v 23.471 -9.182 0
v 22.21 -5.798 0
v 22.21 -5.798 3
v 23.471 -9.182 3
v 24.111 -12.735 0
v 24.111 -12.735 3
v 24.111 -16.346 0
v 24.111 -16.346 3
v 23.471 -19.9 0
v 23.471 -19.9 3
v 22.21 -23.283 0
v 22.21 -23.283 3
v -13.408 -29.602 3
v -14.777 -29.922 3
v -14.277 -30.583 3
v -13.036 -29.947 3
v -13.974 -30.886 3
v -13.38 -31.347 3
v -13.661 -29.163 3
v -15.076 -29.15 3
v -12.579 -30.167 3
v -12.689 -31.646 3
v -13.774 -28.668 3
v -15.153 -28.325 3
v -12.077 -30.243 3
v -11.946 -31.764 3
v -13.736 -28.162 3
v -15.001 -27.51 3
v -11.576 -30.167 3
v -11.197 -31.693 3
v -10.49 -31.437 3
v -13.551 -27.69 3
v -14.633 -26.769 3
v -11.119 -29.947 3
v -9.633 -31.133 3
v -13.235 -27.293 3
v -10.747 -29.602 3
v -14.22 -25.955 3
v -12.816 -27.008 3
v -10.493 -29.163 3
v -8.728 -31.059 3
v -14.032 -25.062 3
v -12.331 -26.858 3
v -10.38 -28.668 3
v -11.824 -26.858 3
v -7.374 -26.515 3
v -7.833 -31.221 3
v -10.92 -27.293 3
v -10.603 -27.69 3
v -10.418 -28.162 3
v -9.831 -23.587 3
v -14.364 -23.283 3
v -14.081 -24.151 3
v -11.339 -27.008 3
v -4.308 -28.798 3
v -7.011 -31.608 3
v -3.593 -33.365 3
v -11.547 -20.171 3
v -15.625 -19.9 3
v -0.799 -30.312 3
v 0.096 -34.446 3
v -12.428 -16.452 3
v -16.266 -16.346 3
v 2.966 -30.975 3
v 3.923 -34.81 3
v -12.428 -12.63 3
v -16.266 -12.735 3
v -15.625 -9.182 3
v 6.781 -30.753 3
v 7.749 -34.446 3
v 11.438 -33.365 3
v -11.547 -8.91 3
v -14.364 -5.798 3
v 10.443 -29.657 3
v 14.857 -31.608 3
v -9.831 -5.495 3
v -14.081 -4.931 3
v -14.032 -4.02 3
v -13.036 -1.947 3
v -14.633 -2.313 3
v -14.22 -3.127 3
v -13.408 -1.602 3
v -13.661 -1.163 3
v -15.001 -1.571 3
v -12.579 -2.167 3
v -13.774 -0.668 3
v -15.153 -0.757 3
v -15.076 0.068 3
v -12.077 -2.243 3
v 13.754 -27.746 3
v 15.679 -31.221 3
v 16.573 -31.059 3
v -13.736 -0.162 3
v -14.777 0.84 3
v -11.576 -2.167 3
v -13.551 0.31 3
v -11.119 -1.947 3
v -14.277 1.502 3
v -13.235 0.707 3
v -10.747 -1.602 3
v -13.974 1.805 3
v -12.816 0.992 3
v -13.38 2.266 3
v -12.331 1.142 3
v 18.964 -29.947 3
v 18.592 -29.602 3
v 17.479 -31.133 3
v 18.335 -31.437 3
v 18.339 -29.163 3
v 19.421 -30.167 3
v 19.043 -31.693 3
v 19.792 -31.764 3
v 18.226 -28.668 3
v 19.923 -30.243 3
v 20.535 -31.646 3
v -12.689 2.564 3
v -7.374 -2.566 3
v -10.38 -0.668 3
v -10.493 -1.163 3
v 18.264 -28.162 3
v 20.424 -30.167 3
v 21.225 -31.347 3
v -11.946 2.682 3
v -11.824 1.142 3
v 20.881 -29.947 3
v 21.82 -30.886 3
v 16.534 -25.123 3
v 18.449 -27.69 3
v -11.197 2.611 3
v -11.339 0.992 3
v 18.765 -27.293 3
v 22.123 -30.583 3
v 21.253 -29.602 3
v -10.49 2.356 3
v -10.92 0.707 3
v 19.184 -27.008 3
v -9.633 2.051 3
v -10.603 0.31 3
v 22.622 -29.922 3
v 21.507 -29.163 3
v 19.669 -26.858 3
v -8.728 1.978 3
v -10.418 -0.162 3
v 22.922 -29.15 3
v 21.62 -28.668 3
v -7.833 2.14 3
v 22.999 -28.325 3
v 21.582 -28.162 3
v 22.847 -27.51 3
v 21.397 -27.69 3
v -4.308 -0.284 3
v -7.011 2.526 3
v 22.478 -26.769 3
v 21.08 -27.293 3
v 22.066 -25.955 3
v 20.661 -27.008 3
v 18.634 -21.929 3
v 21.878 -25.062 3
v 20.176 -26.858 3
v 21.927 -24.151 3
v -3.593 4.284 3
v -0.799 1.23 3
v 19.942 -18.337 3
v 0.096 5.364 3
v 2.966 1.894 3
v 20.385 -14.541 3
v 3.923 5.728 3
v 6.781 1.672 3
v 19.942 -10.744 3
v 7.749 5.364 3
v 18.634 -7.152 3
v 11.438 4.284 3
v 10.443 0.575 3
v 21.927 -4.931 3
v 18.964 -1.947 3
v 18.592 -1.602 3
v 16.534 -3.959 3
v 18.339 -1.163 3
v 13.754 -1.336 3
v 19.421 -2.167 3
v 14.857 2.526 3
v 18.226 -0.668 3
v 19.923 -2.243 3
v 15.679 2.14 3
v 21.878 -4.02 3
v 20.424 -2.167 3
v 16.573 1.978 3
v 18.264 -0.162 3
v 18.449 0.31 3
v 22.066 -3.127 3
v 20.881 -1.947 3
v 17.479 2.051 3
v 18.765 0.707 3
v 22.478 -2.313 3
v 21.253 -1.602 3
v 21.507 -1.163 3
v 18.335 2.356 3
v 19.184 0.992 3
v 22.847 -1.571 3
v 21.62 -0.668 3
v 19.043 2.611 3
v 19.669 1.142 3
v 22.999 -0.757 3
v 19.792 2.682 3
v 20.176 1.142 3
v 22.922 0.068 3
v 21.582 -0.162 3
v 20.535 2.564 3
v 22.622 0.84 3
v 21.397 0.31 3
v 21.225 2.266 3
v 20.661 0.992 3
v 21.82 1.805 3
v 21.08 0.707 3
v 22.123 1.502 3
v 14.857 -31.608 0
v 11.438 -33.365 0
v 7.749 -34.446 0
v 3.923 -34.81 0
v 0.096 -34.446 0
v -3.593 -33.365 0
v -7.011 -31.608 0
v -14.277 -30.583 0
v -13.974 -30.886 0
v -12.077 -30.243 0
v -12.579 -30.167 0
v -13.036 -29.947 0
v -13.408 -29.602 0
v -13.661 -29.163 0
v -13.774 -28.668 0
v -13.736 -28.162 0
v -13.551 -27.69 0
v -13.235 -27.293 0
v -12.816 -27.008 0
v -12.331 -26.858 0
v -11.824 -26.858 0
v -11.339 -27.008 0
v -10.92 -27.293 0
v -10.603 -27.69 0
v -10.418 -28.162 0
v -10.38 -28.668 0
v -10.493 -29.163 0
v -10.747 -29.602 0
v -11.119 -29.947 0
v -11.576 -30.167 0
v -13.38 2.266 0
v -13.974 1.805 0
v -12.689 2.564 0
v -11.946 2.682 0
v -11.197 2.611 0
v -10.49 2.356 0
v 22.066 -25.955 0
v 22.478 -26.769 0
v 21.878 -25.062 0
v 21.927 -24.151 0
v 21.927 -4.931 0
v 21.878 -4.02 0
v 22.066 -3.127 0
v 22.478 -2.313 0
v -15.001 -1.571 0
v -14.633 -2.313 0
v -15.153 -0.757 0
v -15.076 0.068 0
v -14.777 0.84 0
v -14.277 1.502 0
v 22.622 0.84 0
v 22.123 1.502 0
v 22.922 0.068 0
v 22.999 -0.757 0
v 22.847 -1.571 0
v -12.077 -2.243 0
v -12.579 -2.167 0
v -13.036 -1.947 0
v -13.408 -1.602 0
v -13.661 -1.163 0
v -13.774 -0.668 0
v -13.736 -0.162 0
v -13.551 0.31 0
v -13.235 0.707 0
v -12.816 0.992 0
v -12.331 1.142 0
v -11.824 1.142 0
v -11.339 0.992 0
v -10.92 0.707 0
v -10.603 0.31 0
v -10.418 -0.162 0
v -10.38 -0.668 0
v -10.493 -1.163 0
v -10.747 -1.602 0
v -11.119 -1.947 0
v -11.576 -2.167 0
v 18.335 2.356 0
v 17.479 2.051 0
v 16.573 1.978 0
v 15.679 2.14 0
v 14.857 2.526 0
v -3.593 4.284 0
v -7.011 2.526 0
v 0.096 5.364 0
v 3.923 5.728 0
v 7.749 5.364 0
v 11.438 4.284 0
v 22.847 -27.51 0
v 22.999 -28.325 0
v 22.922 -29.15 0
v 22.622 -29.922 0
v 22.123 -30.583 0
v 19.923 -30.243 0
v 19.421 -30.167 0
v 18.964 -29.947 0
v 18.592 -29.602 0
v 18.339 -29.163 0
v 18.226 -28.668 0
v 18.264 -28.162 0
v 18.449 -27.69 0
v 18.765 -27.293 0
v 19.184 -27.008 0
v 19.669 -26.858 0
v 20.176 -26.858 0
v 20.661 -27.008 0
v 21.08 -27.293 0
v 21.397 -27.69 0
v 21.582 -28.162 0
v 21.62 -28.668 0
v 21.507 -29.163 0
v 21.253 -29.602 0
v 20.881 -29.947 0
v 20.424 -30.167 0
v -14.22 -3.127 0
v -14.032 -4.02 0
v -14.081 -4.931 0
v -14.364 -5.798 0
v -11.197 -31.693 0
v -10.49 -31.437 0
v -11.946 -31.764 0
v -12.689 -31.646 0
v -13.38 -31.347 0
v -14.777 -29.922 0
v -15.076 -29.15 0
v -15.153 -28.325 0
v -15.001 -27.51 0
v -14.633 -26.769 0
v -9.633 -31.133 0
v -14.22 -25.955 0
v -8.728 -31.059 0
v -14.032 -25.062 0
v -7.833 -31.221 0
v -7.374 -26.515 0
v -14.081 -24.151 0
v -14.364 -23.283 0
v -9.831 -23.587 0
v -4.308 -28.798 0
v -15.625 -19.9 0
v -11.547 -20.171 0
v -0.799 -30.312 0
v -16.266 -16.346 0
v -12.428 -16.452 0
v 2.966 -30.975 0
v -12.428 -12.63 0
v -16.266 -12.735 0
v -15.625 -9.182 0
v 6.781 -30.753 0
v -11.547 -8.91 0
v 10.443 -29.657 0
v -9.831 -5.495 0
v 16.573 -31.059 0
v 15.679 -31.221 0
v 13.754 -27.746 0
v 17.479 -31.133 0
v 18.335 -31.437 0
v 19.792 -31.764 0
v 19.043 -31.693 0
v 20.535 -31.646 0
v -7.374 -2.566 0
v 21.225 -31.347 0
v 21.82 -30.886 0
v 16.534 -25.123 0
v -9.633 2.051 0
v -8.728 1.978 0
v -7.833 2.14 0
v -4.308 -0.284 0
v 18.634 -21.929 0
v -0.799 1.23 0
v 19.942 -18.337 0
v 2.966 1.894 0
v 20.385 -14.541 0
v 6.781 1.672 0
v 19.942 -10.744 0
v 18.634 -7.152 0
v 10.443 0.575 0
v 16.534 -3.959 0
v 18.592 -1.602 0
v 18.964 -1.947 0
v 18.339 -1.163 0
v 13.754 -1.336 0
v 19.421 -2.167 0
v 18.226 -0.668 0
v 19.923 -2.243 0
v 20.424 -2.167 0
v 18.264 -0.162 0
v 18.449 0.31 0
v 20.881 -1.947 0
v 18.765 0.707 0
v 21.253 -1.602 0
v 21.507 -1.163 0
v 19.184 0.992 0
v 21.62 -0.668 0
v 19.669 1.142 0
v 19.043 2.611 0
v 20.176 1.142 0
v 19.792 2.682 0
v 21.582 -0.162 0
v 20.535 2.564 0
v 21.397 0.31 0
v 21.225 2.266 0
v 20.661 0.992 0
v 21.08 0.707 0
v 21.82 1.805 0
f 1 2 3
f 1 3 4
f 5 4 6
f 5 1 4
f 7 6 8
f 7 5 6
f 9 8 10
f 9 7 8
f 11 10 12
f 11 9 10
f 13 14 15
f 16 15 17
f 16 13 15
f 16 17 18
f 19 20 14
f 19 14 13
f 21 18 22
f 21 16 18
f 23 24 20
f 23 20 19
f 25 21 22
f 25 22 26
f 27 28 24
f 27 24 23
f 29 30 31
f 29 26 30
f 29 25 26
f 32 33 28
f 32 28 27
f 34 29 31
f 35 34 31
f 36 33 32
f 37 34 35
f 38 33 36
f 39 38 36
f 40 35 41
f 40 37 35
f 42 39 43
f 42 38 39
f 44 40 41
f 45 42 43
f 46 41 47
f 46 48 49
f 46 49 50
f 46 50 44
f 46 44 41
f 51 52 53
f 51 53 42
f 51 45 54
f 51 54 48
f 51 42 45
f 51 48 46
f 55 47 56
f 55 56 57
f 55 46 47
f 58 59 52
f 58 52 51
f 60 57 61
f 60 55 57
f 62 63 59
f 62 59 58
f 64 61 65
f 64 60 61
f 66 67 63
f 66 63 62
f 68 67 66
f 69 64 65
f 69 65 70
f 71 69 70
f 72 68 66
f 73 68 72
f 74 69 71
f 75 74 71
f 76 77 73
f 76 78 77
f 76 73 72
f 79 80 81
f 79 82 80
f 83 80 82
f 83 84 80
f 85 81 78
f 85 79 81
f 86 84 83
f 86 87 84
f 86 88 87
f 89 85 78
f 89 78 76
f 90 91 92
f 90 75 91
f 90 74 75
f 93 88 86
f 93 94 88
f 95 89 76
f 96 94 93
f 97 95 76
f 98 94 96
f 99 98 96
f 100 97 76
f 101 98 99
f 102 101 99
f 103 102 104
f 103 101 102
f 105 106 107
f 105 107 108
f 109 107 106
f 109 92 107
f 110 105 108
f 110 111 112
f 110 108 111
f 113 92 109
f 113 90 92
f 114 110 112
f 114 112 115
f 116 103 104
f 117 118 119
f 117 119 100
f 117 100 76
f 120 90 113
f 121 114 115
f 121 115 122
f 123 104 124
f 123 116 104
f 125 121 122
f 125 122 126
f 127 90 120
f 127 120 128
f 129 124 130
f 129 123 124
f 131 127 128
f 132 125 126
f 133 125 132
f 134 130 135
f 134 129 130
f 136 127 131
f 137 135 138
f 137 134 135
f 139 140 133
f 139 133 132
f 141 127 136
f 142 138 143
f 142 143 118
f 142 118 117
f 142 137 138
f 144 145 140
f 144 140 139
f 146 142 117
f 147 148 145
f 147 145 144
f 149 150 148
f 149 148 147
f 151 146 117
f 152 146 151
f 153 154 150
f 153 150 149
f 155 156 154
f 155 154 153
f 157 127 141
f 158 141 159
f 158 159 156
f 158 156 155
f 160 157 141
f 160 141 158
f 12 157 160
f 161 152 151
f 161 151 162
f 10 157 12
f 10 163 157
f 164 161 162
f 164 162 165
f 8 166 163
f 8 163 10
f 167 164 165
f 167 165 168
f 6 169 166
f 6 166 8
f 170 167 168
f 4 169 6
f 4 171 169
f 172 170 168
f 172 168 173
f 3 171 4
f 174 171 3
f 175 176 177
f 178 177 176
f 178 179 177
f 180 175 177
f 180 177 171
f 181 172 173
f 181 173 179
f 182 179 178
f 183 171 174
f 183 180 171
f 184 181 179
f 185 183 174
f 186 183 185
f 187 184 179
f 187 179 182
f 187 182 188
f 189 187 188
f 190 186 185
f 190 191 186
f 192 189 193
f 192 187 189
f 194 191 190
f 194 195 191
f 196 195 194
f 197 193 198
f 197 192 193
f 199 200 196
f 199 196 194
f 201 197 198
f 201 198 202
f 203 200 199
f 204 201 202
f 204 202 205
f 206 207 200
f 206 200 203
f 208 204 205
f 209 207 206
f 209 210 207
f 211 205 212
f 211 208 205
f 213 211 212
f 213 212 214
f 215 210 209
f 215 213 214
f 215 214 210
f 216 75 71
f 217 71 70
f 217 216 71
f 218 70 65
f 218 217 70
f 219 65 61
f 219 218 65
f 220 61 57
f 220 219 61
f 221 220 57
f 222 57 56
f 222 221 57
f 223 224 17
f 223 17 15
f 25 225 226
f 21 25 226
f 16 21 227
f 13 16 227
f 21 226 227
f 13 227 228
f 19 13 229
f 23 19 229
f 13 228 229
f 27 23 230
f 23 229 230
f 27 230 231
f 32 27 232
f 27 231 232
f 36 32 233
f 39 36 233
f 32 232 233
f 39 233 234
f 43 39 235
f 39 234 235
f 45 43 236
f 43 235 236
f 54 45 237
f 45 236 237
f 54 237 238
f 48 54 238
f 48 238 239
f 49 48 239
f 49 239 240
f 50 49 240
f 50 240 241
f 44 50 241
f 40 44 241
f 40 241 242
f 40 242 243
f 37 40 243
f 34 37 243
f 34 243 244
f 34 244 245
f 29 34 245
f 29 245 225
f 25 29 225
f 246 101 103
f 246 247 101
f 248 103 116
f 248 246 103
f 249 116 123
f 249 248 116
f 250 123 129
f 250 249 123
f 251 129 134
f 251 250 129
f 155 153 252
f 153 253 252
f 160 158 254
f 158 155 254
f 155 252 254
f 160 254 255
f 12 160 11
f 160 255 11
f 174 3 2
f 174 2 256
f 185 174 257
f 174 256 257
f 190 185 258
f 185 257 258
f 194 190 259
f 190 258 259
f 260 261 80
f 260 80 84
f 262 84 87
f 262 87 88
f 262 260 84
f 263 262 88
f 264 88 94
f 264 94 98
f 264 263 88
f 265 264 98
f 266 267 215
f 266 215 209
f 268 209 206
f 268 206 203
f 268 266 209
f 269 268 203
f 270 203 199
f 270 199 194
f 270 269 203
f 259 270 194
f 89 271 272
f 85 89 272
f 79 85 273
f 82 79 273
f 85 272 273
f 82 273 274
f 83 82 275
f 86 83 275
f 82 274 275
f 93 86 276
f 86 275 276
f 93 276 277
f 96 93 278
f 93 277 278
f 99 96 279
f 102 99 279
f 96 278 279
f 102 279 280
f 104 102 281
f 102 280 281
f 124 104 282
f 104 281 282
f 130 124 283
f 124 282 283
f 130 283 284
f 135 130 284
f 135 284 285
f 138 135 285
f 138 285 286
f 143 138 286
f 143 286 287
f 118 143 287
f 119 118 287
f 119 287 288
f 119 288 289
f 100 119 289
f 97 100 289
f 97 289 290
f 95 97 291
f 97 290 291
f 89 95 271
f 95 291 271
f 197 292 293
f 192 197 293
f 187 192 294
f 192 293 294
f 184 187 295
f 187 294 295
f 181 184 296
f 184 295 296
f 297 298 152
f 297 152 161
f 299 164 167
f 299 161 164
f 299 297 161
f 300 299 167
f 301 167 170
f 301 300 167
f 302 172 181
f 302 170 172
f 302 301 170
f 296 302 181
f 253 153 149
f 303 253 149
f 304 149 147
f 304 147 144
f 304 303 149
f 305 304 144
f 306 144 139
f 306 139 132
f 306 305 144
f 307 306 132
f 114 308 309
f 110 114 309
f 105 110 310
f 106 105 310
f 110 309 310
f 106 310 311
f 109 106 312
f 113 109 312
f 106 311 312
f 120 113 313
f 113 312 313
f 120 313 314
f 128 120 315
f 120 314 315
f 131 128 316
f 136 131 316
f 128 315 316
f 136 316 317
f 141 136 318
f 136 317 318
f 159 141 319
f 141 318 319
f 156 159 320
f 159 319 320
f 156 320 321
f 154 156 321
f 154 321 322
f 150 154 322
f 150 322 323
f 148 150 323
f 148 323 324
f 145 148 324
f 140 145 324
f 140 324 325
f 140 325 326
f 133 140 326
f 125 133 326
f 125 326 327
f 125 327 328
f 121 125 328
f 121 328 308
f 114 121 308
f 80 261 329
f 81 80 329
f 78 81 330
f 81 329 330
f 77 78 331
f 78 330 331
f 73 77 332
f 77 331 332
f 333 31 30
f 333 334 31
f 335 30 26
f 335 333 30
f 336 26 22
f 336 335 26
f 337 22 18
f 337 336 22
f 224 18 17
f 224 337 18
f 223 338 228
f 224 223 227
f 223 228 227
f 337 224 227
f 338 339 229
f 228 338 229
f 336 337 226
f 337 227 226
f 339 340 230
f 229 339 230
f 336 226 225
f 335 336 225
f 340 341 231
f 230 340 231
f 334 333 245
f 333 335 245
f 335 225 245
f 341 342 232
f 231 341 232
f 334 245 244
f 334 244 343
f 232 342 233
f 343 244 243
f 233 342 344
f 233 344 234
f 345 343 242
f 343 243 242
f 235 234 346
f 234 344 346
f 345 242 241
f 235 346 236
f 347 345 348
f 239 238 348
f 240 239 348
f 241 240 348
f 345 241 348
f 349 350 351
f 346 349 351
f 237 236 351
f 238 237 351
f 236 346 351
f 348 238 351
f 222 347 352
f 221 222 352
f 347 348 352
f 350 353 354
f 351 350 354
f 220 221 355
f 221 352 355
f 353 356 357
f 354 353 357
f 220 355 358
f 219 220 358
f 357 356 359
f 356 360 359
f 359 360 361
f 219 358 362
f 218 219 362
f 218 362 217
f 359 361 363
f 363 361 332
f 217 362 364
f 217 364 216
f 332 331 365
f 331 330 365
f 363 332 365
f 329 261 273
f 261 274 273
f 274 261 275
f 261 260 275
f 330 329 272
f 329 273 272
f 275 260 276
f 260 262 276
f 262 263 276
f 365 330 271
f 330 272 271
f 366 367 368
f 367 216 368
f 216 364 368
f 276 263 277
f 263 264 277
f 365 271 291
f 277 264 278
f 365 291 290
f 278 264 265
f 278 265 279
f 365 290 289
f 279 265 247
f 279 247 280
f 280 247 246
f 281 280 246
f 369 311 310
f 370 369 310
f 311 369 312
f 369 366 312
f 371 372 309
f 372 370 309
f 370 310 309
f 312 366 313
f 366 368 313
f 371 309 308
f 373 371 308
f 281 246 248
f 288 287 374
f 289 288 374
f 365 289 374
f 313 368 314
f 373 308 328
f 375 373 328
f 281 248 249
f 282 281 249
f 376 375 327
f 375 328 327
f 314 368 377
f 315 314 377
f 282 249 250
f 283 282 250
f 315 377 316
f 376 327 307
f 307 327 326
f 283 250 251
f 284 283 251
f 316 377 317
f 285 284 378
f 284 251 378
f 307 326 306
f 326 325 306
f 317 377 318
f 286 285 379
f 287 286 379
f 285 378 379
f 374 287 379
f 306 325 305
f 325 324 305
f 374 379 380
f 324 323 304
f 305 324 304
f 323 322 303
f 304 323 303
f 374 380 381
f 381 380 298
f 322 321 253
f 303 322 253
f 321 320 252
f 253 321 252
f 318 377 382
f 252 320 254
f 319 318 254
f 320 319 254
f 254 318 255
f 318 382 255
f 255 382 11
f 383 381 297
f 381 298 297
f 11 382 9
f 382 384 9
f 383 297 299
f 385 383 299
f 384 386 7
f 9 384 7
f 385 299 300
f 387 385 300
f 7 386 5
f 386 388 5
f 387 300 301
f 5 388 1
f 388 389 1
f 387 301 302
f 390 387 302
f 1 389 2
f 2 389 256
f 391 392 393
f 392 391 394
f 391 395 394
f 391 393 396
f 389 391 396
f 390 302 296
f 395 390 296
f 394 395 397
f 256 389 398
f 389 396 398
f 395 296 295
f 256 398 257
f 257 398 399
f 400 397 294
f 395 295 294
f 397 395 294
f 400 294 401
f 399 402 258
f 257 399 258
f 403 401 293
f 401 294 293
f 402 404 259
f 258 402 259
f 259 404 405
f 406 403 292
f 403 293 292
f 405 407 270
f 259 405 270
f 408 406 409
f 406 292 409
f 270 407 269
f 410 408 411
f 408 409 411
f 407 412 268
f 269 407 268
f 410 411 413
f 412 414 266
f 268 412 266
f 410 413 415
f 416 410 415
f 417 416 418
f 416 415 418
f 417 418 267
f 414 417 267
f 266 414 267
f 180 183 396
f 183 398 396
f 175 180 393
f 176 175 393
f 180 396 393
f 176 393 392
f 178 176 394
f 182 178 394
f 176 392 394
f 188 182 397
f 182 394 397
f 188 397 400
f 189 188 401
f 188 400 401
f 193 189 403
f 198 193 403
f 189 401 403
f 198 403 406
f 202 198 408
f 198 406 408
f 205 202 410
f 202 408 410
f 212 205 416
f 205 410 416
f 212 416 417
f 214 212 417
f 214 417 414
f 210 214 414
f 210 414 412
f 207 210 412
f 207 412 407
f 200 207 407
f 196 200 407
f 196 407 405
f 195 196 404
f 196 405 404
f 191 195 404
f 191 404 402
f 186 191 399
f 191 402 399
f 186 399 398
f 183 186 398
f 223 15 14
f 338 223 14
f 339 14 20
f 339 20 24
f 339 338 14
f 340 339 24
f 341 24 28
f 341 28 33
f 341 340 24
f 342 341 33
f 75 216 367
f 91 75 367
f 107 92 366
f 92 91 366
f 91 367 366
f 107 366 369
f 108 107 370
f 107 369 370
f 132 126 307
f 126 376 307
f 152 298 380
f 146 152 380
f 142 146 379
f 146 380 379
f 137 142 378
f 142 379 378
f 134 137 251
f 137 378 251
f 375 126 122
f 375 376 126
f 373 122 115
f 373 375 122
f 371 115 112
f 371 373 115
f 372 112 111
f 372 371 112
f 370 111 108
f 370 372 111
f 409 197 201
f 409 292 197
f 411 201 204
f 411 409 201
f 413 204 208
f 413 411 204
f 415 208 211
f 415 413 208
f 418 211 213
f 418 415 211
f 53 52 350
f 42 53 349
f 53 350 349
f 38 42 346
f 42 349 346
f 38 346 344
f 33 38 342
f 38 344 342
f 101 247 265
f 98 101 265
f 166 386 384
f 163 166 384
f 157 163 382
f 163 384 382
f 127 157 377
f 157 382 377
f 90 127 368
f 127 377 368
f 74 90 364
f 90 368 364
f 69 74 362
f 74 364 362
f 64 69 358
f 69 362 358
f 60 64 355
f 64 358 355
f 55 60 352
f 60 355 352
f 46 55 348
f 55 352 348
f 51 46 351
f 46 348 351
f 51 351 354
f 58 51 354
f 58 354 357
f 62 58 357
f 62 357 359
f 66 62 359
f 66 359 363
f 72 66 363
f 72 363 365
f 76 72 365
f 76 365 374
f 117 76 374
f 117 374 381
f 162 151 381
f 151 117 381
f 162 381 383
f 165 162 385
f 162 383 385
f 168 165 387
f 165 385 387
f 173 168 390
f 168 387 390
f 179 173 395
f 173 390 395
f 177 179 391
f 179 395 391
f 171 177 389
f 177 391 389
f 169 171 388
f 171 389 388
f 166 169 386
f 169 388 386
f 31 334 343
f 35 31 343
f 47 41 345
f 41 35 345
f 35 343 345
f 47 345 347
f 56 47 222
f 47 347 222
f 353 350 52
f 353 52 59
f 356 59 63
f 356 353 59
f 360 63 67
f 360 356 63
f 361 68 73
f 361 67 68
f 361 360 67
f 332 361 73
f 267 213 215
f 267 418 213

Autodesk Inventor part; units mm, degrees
ref_plane "YZ Plane" through (0, 0, 0) normal (1, 0, 0) x (0, 1, 0)
ref_plane "XZ Plane" through (0, 0, 0) normal (0, 1, 0) x (-1, 0, 0)
ref_plane "XY Plane" through (0, 0, 0) normal (0, 0, 1) x (1, 0, 0)
sketch "Sketch6" plane through (0, 0, 0) normal (0, 0, 1) x (1, 0, 0)
  circle A0 centre (3.9228, -14.5408) radius 10.15
  line L0 (10.903848, -34.81) -> (-10.903848, -34.81)
  line L1 (54.2, 8.803848) -> (54.2, -8.803848)
  circle A1 centre (3.9228, -14.5408) radius 16.4625
  circle A2 centre (19.9228, -0.5408) radius 1.5
  circle A3 centre (3.9228, -14.5408) radius 18.415
  line L2 (3.9228, -14.5408) -> (3.9228, -8.803848)
  line L3 (3.9228, -14.5408) -> (9.053444, -14.5408)
  circle A4 centre (3.9228, -14.5408) radius 20.2692
  line L4 (17.090037, 0.869078) -> (19.9228, 3.701841)
  line L5 (21.032601, -3.67364) -> (24.165441, -0.5408)
  line L6 (19.9228, 3.701841) -> (24.165441, -0.5408)
  line L7 (3.9228, -14.5408) -> (19.9228, -0.5408) construction
  line L8 (-12.0772, 3.701841) -> (-16.319841, -0.5408)
  line L9 (-13.187001, -3.67364) -> (-16.319841, -0.5408)
  circle A5 centre (-12.0772, -0.5408) radius 1.5
  line L10 (-9.244437, 0.869078) -> (-12.0772, 3.701841)
  line L11 (-9.244437, -29.950678) -> (-12.0772, -32.783441)
  line L12 (-12.0772, -32.783441) -> (-16.319841, -28.5408)
  circle A6 centre (-12.0772, -28.5408) radius 1.5
  line L13 (-13.187001, -25.40796) -> (-16.319841, -28.5408)
  line L14 (17.090037, -29.950678) -> (19.9228, -32.783441)
  line L15 (19.9228, -32.783441) -> (24.165441, -28.5408)
  line L16 (21.032601, -25.40796) -> (24.165441, -28.5408)
  circle A7 centre (19.9228, -28.5408) radius 1.5
  line L17 (24.165441, -28.5408) -> (18.258589, -22.633949)
  line L18 (19.9228, -32.783441) -> (14.388092, -27.248733)
  line L19 (-12.0772, -32.783441) -> (-6.542492, -27.248733)
  line L20 (-16.319841, -28.5408) -> (-10.412989, -22.633949)
  line L21 (-16.319841, -0.5408) -> (-10.412989, -6.447651)
  line L22 (-12.0772, 3.701841) -> (-6.542492, -1.832867)
  point P0 (0, 0)
  point P1 (0, 0)
  dimension "d53" = 32.925
  dimension "d54" = 3
  dimension "d55" = 36.83
  dimension "d56" = 14
  dimension "d57" = 16
  dimension "d58" = 45
  dimension "d59" = 3
  dimension "d60" = 3
  dimension "d61" = 3
extrude "Extrusion4" add sketch "Sketch6" along normal blind 3 contours A1 L22 A3 L17 | A1 L21 A3 L22 | L17 A3 L18 A1 | A1 L20 A3 L21 | L22 A4 A2 L17 A3 | A3 L21 A4 A5 L22 | L18 A3 L19 A1 | L17 A4 A7 L18 A3 | A1 L19 A3 L20 | A3 L20 A4 L21 | A4 A5 L9 L8 L10 | L18 A4 L19 A3 | L16 L15 L14 A4 A7 | A3 L19 A4 A6 L20 | L4 L6 L5 A4 A2 | A5 A4 | A4 A5 | A7 A4 | A4 A7 | A4 A6 L11 L12 L13 | A4 A2 | A2 A4 | A6 A4 | A4 A6
fillet "Fillet4" radius 3.5 8 edges at (-9.2444, 0.8691, 1.5) (-13.187, -3.6736, 1.5) (-13.187, -25.408, 1.5) (-9.2444, -29.9507, 1.5) (17.09, 0.8691, 1.5) (21.0326, -3.6736, 1.5) (21.0326, -25.408, 1.5) (17.09, -29.9507, 1.5)
fillet "Fillet5" radius 3 8 edges at (19.9228, 3.7018, 1.5) (24.1654, -0.5408, 1.5) (24.1654, -28.5408, 1.5) (19.9228, -32.7834, 1.5) (-16.3198, -28.5408, 1.5) (-12.0772, -32.7834, 1.5) (-16.3198, -0.5408, 1.5) (-12.0772, 3.7018, 1.5)
sketch "Sketch7" plane through (0, 0, 3) normal (0, 0, 1) x (1, 0, 0)
  circle A0 centre (3.9228, -14.5408) radius 10.15
  line L0 (10.903848, -34.81) -> (-10.903848, -34.81)
  line L1 (54.2, 8.803848) -> (54.2, -8.803848)
  circle A1 centre (3.9228, -14.5408) radius 16.4625
  circle A2 centre (19.9228, -0.5408) radius 1.5
  circle A3 centre (3.9228, -14.5408) radius 18.415
  line L2 (3.9228, -14.5408) -> (3.9228, -8.803848)
  line L3 (3.9228, -14.5408) -> (9.053444, -14.5408)
  circle A4 centre (3.9228, -14.5408) radius 20.2692
  line L4 (17.090037, 0.869078) -> (19.9228, 3.701841)
  line L5 (21.032601, -3.67364) -> (24.165441, -0.5408)
  line L6 (19.9228, 3.701841) -> (24.165441, -0.5408)
  line L7 (3.9228, -14.5408) -> (19.9228, -0.5408) construction
  line L8 (-12.0772, 3.701841) -> (-16.319841, -0.5408)
  line L9 (-13.187001, -3.67364) -> (-16.319841, -0.5408)
  circle A5 centre (-12.0772, -0.5408) radius 1.5
  line L10 (-9.244437, 0.869078) -> (-12.0772, 3.701841)
  line L11 (-9.244437, -29.950678) -> (-12.0772, -32.783441)
  line L12 (-12.0772, -32.783441) -> (-16.319841, -28.5408)
  circle A6 centre (-12.0772, -28.5408) radius 1.5
  line L13 (-13.187001, -25.40796) -> (-16.319841, -28.5408)
  line L14 (17.090037, -29.950678) -> (19.9228, -32.783441)
  line L15 (19.9228, -32.783441) -> (24.165441, -28.5408)
  line L16 (21.032601, -25.40796) -> (24.165441, -28.5408)
  circle A7 centre (19.9228, -28.5408) radius 1.5
  line L17 (24.165441, -28.5408) -> (18.258589, -22.633949)
  line L18 (19.9228, -32.783441) -> (14.388092, -27.248733)
  line L19 (-12.0772, -32.783441) -> (-6.542492, -27.248733)
  line L20 (-16.319841, -28.5408) -> (-10.412989, -22.633949)
  line L21 (-16.319841, -0.5408) -> (-10.412989, -6.447651)
  line L22 (-12.0772, 3.701841) -> (-6.542492, -1.832867)
  point P0 (0, 0)
  point P1 (0, 0)
  dimension "d66" = 32.925
  dimension "d67" = 3
  dimension "d68" = 36.83
  dimension "d69" = 14
  dimension "d70" = 16
  dimension "d71" = 45
  dimension "d72" = 3
  dimension "d73" = 3
  dimension "d74" = 3
hole "Hole3" at (-12.0772, -0.5408, 3) at (-12.0772, -28.5408, 3) at (19.9228, -28.5408, 3) at (19.9228, -0.5408, 3) direction (0, 0, -1) diameter 3.4036 depth 25.4 tip angle 118 clearance for "Flat Head Machine Screw" size "M3" standard "Ansi Metric M Profile"
properties part number "Cam.case.glassmount" material "Aluminum-6061"
